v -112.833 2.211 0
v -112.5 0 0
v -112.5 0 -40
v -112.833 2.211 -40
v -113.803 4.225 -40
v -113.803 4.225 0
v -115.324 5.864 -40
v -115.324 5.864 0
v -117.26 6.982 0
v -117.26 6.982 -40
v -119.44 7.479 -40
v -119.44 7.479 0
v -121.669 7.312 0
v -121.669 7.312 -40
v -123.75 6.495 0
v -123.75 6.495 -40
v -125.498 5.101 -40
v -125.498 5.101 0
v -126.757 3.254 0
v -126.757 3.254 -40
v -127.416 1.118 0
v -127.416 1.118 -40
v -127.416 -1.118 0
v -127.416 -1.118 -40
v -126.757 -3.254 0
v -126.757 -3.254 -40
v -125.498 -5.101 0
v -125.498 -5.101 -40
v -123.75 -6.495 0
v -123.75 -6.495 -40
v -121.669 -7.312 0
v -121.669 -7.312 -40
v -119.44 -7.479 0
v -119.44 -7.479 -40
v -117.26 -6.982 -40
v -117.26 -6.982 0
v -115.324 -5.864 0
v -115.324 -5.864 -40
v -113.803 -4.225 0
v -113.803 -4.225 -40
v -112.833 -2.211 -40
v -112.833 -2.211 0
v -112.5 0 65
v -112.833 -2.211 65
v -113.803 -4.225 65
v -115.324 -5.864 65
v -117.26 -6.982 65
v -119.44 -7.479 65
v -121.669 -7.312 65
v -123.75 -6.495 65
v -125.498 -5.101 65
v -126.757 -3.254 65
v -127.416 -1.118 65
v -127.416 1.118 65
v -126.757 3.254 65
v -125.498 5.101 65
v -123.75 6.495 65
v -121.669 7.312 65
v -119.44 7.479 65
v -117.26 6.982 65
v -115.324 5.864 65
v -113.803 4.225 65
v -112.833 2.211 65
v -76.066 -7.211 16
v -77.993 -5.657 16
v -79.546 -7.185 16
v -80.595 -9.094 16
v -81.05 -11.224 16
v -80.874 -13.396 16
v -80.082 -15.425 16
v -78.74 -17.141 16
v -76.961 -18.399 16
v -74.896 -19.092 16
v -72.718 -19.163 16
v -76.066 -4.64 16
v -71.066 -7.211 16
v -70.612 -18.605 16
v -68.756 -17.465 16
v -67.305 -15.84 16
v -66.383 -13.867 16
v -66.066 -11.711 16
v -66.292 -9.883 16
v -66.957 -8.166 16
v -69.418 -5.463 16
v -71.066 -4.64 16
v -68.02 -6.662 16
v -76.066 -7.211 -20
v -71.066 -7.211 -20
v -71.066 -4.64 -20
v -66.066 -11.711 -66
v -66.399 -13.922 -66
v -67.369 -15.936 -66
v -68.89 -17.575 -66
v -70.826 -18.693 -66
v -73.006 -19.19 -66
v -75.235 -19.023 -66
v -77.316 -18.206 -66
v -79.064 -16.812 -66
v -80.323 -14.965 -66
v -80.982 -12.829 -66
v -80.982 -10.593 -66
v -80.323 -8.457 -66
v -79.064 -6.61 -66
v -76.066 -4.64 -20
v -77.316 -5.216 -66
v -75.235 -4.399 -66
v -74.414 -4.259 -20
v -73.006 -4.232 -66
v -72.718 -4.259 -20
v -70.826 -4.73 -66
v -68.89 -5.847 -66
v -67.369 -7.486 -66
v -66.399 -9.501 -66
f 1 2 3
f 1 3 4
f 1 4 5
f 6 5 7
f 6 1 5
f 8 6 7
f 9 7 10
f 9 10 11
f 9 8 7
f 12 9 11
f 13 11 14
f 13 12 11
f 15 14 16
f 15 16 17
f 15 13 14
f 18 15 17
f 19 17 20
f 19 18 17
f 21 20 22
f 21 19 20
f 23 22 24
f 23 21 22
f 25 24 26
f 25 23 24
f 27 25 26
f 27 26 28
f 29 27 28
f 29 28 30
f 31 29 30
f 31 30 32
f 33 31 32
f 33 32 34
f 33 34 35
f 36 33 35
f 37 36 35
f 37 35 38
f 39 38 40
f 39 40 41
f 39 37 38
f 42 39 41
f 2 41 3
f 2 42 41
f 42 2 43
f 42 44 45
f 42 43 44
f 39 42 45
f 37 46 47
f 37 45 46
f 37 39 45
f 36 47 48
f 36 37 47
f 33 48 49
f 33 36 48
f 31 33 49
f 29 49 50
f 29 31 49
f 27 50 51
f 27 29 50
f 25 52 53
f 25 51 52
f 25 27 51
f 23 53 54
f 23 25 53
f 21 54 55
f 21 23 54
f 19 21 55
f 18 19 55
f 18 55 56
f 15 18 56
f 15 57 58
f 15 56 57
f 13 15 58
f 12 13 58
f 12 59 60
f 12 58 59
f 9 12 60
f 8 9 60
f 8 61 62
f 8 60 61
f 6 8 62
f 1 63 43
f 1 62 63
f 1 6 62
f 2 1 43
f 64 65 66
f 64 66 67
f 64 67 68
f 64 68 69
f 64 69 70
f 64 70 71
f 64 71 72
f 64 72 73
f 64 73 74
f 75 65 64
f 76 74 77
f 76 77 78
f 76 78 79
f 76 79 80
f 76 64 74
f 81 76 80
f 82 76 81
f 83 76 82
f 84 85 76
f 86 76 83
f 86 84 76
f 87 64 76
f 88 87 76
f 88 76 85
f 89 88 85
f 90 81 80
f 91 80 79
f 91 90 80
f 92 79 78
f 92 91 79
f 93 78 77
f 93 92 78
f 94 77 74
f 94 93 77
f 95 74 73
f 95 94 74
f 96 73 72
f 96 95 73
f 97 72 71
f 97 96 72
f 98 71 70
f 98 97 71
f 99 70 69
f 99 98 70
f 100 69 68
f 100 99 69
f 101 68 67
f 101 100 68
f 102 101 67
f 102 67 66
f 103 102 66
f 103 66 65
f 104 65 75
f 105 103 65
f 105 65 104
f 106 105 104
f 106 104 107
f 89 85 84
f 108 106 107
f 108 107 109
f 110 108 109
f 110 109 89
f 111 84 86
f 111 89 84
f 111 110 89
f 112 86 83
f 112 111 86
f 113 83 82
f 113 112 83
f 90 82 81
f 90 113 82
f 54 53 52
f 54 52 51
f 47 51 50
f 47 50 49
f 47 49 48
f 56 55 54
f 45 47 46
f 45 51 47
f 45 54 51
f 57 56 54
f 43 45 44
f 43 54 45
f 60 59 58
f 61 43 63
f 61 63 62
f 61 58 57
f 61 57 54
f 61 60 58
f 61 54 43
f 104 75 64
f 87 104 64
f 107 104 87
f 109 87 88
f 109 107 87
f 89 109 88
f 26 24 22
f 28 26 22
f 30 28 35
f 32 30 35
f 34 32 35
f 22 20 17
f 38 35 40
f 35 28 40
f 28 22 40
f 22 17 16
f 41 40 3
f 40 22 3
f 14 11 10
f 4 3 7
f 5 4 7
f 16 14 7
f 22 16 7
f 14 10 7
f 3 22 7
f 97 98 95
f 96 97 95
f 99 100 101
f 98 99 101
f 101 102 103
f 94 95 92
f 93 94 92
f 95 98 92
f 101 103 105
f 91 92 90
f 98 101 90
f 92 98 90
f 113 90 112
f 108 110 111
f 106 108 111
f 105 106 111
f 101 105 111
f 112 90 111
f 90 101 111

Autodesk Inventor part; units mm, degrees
ref_plane "YZ Plane" through (0, 0, 0) normal (1, 0, 0) x (0, 1, 0)
sketch "Sketch1" plane through (0, 0, 0) normal (0, 0, 1) x (1, 0, 0)
  circle A0 centre (0, 0) radius 47.888 construction
  circle A1 centre (-120, 0) radius 21.2836 construction
  line L0 (-120, 0) -> (0, 0) construction
  circle A2 centre (0, 0) radius 33
  circle A3 centre (-73.5661, -11.7112) radius 26.6044 construction
  dimension "d0" = 95.776
  dimension "d1" = 42.5671
  dimension "d4" = 120
  dimension "d16" = 66
  dimension "d17" = 53.2089
sketch "Sketch2" plane through (0, 0, 0) normal (0, 0, 1) x (1, 0, 0)
  circle A0 centre (-120, 0) radius 7.5
  circle A1 centre (-120, 0) radius 21.2836 construction
  circle A2 centre (-73.5661, 11.7112) radius 26.6044 construction
  line L0 (-120, 0) -> (-100.9074, 0) construction
  line L1 (-120, 0) -> (-120, 23.2296) construction
  point P0 (0, 0)
  dimension "d5" = 15
extrude "Extrusion1" add sketch "Sketch2" along normal blind 65 and the other way blind 40
sketch "Sketch4" plane through (0, 0, 0) normal (0, 0, 1) x (1, 0, 0)
  circle A0 centre (-73.5661, -11.7112) radius 7.5
  circle A1 centre (-73.5661, -11.7112) radius 26.6044 construction
  line L0 (-73.5661, -11.7112) -> (-73.5661, 40.9362) construction
  line L1 (-73.5661, -11.7112) -> (-109.3594, -11.7112) construction
  point P0 (0, 0)
  dimension "d18" = 15
extrude "Extrusion3" add sketch "Sketch4" along normal blind 16 and the other way blind 66 separate body
sketch3d "3D Sketch1"
ref_plane "Work Plane1" through (-73.5661, -11.7112, 48.9351) normal (1, 0, 0) x (0, 0, -1)
sketch3d "3D Sketch2"
ref_plane "Work Plane2" through (-120, 0, 0) normal (1, 0, 0) x (0, 1, 0)
sketch "Sketch5" plane through (-73.5661, -11.7112, 16) normal (0, 0, 1) x (1, 0, 0)
  circle A0 centre (0, 0) radius 7.5 construction
  line L0 (0, 0) -> (0, 31.0502) construction
  line L1 (-14.5269, 7.5) -> (19.4754, 7.5) construction
  line L2 (-2.5, 9.5) -> (-2.5, 4.5)
  line L3 (-2.5, 4.5) -> (2.5, 4.5)
  line L4 (2.5, 4.5) -> (2.5, 9.5)
  line L5 (2.5, 9.5) -> (-2.5, 9.5)
  point P0 (73.5661, 11.7112)
  point P1 (2.5, 7.5)
  point P2 (0, 9.5)
  dimension "d23" = 5
  dimension "IMKEY_D" = 3
extrude "Extrusion4" cut sketch "Sketch5" against normal blind 36
equation "\"d0\" = d3"
equation "\"d1\" = d3_1"
equation "\"d16\" = Nut_OD"
equation "\"d17\" = d3_1_2"
equation "\"d5\" = Pin_DIA"
equation "\"d9\" = d1_1 + Hub_L"
equation "\"d18\" = GearPin_DIA"
equation "\"d23\" = IMKEY_W"
equation "\"IdleGearPin_L\" = 1"
equation "\"Bearing_WIDTH\" = 11"
equation "\"Pin_DIA\" = GearPin_DIA"
equation "\"TD\" = 0.3"
equation "\"Ball_DIA\" = 6"
equation "\"Screw_L\" = 292"
equation "\"Screw_DIA\" = 36"
equation "\"Nut_OD\" = 66"
equation "\"BPath_REVQ\" = 5.75"
equation "\"Tread_OFFSET\" = 8.075"
equation "\"SteeringColumn_DIA\" = 26"
equation "\"SteeringColumnChamfer_DEG\" = 20deg"
equation "\"Rack_L\" = 307.252"
equation "\"NutCapTread_L\" = 25"
equation "\"NutCapTread_THICKNESS\" = 5.365"
equation "\"SupportFlange_THICKNESS\" = 5"
equation "\"Bearing_OD\" = 35"
equation "\"GearKey_L\" = 32"
equation "\"d3\" = 95.776"
equation "\"d3_1\" = 42.567111"
equation "\"d3_1_2\" = 53.208889"
equation "\"d1_1\" = 30"
equation "\"Hub_L\" = 10"
equation "\"GearPin_DIA\" = 15"
equation "\"IMKEY_W\" = 5"
properties part number "MCEN4000:P1"
